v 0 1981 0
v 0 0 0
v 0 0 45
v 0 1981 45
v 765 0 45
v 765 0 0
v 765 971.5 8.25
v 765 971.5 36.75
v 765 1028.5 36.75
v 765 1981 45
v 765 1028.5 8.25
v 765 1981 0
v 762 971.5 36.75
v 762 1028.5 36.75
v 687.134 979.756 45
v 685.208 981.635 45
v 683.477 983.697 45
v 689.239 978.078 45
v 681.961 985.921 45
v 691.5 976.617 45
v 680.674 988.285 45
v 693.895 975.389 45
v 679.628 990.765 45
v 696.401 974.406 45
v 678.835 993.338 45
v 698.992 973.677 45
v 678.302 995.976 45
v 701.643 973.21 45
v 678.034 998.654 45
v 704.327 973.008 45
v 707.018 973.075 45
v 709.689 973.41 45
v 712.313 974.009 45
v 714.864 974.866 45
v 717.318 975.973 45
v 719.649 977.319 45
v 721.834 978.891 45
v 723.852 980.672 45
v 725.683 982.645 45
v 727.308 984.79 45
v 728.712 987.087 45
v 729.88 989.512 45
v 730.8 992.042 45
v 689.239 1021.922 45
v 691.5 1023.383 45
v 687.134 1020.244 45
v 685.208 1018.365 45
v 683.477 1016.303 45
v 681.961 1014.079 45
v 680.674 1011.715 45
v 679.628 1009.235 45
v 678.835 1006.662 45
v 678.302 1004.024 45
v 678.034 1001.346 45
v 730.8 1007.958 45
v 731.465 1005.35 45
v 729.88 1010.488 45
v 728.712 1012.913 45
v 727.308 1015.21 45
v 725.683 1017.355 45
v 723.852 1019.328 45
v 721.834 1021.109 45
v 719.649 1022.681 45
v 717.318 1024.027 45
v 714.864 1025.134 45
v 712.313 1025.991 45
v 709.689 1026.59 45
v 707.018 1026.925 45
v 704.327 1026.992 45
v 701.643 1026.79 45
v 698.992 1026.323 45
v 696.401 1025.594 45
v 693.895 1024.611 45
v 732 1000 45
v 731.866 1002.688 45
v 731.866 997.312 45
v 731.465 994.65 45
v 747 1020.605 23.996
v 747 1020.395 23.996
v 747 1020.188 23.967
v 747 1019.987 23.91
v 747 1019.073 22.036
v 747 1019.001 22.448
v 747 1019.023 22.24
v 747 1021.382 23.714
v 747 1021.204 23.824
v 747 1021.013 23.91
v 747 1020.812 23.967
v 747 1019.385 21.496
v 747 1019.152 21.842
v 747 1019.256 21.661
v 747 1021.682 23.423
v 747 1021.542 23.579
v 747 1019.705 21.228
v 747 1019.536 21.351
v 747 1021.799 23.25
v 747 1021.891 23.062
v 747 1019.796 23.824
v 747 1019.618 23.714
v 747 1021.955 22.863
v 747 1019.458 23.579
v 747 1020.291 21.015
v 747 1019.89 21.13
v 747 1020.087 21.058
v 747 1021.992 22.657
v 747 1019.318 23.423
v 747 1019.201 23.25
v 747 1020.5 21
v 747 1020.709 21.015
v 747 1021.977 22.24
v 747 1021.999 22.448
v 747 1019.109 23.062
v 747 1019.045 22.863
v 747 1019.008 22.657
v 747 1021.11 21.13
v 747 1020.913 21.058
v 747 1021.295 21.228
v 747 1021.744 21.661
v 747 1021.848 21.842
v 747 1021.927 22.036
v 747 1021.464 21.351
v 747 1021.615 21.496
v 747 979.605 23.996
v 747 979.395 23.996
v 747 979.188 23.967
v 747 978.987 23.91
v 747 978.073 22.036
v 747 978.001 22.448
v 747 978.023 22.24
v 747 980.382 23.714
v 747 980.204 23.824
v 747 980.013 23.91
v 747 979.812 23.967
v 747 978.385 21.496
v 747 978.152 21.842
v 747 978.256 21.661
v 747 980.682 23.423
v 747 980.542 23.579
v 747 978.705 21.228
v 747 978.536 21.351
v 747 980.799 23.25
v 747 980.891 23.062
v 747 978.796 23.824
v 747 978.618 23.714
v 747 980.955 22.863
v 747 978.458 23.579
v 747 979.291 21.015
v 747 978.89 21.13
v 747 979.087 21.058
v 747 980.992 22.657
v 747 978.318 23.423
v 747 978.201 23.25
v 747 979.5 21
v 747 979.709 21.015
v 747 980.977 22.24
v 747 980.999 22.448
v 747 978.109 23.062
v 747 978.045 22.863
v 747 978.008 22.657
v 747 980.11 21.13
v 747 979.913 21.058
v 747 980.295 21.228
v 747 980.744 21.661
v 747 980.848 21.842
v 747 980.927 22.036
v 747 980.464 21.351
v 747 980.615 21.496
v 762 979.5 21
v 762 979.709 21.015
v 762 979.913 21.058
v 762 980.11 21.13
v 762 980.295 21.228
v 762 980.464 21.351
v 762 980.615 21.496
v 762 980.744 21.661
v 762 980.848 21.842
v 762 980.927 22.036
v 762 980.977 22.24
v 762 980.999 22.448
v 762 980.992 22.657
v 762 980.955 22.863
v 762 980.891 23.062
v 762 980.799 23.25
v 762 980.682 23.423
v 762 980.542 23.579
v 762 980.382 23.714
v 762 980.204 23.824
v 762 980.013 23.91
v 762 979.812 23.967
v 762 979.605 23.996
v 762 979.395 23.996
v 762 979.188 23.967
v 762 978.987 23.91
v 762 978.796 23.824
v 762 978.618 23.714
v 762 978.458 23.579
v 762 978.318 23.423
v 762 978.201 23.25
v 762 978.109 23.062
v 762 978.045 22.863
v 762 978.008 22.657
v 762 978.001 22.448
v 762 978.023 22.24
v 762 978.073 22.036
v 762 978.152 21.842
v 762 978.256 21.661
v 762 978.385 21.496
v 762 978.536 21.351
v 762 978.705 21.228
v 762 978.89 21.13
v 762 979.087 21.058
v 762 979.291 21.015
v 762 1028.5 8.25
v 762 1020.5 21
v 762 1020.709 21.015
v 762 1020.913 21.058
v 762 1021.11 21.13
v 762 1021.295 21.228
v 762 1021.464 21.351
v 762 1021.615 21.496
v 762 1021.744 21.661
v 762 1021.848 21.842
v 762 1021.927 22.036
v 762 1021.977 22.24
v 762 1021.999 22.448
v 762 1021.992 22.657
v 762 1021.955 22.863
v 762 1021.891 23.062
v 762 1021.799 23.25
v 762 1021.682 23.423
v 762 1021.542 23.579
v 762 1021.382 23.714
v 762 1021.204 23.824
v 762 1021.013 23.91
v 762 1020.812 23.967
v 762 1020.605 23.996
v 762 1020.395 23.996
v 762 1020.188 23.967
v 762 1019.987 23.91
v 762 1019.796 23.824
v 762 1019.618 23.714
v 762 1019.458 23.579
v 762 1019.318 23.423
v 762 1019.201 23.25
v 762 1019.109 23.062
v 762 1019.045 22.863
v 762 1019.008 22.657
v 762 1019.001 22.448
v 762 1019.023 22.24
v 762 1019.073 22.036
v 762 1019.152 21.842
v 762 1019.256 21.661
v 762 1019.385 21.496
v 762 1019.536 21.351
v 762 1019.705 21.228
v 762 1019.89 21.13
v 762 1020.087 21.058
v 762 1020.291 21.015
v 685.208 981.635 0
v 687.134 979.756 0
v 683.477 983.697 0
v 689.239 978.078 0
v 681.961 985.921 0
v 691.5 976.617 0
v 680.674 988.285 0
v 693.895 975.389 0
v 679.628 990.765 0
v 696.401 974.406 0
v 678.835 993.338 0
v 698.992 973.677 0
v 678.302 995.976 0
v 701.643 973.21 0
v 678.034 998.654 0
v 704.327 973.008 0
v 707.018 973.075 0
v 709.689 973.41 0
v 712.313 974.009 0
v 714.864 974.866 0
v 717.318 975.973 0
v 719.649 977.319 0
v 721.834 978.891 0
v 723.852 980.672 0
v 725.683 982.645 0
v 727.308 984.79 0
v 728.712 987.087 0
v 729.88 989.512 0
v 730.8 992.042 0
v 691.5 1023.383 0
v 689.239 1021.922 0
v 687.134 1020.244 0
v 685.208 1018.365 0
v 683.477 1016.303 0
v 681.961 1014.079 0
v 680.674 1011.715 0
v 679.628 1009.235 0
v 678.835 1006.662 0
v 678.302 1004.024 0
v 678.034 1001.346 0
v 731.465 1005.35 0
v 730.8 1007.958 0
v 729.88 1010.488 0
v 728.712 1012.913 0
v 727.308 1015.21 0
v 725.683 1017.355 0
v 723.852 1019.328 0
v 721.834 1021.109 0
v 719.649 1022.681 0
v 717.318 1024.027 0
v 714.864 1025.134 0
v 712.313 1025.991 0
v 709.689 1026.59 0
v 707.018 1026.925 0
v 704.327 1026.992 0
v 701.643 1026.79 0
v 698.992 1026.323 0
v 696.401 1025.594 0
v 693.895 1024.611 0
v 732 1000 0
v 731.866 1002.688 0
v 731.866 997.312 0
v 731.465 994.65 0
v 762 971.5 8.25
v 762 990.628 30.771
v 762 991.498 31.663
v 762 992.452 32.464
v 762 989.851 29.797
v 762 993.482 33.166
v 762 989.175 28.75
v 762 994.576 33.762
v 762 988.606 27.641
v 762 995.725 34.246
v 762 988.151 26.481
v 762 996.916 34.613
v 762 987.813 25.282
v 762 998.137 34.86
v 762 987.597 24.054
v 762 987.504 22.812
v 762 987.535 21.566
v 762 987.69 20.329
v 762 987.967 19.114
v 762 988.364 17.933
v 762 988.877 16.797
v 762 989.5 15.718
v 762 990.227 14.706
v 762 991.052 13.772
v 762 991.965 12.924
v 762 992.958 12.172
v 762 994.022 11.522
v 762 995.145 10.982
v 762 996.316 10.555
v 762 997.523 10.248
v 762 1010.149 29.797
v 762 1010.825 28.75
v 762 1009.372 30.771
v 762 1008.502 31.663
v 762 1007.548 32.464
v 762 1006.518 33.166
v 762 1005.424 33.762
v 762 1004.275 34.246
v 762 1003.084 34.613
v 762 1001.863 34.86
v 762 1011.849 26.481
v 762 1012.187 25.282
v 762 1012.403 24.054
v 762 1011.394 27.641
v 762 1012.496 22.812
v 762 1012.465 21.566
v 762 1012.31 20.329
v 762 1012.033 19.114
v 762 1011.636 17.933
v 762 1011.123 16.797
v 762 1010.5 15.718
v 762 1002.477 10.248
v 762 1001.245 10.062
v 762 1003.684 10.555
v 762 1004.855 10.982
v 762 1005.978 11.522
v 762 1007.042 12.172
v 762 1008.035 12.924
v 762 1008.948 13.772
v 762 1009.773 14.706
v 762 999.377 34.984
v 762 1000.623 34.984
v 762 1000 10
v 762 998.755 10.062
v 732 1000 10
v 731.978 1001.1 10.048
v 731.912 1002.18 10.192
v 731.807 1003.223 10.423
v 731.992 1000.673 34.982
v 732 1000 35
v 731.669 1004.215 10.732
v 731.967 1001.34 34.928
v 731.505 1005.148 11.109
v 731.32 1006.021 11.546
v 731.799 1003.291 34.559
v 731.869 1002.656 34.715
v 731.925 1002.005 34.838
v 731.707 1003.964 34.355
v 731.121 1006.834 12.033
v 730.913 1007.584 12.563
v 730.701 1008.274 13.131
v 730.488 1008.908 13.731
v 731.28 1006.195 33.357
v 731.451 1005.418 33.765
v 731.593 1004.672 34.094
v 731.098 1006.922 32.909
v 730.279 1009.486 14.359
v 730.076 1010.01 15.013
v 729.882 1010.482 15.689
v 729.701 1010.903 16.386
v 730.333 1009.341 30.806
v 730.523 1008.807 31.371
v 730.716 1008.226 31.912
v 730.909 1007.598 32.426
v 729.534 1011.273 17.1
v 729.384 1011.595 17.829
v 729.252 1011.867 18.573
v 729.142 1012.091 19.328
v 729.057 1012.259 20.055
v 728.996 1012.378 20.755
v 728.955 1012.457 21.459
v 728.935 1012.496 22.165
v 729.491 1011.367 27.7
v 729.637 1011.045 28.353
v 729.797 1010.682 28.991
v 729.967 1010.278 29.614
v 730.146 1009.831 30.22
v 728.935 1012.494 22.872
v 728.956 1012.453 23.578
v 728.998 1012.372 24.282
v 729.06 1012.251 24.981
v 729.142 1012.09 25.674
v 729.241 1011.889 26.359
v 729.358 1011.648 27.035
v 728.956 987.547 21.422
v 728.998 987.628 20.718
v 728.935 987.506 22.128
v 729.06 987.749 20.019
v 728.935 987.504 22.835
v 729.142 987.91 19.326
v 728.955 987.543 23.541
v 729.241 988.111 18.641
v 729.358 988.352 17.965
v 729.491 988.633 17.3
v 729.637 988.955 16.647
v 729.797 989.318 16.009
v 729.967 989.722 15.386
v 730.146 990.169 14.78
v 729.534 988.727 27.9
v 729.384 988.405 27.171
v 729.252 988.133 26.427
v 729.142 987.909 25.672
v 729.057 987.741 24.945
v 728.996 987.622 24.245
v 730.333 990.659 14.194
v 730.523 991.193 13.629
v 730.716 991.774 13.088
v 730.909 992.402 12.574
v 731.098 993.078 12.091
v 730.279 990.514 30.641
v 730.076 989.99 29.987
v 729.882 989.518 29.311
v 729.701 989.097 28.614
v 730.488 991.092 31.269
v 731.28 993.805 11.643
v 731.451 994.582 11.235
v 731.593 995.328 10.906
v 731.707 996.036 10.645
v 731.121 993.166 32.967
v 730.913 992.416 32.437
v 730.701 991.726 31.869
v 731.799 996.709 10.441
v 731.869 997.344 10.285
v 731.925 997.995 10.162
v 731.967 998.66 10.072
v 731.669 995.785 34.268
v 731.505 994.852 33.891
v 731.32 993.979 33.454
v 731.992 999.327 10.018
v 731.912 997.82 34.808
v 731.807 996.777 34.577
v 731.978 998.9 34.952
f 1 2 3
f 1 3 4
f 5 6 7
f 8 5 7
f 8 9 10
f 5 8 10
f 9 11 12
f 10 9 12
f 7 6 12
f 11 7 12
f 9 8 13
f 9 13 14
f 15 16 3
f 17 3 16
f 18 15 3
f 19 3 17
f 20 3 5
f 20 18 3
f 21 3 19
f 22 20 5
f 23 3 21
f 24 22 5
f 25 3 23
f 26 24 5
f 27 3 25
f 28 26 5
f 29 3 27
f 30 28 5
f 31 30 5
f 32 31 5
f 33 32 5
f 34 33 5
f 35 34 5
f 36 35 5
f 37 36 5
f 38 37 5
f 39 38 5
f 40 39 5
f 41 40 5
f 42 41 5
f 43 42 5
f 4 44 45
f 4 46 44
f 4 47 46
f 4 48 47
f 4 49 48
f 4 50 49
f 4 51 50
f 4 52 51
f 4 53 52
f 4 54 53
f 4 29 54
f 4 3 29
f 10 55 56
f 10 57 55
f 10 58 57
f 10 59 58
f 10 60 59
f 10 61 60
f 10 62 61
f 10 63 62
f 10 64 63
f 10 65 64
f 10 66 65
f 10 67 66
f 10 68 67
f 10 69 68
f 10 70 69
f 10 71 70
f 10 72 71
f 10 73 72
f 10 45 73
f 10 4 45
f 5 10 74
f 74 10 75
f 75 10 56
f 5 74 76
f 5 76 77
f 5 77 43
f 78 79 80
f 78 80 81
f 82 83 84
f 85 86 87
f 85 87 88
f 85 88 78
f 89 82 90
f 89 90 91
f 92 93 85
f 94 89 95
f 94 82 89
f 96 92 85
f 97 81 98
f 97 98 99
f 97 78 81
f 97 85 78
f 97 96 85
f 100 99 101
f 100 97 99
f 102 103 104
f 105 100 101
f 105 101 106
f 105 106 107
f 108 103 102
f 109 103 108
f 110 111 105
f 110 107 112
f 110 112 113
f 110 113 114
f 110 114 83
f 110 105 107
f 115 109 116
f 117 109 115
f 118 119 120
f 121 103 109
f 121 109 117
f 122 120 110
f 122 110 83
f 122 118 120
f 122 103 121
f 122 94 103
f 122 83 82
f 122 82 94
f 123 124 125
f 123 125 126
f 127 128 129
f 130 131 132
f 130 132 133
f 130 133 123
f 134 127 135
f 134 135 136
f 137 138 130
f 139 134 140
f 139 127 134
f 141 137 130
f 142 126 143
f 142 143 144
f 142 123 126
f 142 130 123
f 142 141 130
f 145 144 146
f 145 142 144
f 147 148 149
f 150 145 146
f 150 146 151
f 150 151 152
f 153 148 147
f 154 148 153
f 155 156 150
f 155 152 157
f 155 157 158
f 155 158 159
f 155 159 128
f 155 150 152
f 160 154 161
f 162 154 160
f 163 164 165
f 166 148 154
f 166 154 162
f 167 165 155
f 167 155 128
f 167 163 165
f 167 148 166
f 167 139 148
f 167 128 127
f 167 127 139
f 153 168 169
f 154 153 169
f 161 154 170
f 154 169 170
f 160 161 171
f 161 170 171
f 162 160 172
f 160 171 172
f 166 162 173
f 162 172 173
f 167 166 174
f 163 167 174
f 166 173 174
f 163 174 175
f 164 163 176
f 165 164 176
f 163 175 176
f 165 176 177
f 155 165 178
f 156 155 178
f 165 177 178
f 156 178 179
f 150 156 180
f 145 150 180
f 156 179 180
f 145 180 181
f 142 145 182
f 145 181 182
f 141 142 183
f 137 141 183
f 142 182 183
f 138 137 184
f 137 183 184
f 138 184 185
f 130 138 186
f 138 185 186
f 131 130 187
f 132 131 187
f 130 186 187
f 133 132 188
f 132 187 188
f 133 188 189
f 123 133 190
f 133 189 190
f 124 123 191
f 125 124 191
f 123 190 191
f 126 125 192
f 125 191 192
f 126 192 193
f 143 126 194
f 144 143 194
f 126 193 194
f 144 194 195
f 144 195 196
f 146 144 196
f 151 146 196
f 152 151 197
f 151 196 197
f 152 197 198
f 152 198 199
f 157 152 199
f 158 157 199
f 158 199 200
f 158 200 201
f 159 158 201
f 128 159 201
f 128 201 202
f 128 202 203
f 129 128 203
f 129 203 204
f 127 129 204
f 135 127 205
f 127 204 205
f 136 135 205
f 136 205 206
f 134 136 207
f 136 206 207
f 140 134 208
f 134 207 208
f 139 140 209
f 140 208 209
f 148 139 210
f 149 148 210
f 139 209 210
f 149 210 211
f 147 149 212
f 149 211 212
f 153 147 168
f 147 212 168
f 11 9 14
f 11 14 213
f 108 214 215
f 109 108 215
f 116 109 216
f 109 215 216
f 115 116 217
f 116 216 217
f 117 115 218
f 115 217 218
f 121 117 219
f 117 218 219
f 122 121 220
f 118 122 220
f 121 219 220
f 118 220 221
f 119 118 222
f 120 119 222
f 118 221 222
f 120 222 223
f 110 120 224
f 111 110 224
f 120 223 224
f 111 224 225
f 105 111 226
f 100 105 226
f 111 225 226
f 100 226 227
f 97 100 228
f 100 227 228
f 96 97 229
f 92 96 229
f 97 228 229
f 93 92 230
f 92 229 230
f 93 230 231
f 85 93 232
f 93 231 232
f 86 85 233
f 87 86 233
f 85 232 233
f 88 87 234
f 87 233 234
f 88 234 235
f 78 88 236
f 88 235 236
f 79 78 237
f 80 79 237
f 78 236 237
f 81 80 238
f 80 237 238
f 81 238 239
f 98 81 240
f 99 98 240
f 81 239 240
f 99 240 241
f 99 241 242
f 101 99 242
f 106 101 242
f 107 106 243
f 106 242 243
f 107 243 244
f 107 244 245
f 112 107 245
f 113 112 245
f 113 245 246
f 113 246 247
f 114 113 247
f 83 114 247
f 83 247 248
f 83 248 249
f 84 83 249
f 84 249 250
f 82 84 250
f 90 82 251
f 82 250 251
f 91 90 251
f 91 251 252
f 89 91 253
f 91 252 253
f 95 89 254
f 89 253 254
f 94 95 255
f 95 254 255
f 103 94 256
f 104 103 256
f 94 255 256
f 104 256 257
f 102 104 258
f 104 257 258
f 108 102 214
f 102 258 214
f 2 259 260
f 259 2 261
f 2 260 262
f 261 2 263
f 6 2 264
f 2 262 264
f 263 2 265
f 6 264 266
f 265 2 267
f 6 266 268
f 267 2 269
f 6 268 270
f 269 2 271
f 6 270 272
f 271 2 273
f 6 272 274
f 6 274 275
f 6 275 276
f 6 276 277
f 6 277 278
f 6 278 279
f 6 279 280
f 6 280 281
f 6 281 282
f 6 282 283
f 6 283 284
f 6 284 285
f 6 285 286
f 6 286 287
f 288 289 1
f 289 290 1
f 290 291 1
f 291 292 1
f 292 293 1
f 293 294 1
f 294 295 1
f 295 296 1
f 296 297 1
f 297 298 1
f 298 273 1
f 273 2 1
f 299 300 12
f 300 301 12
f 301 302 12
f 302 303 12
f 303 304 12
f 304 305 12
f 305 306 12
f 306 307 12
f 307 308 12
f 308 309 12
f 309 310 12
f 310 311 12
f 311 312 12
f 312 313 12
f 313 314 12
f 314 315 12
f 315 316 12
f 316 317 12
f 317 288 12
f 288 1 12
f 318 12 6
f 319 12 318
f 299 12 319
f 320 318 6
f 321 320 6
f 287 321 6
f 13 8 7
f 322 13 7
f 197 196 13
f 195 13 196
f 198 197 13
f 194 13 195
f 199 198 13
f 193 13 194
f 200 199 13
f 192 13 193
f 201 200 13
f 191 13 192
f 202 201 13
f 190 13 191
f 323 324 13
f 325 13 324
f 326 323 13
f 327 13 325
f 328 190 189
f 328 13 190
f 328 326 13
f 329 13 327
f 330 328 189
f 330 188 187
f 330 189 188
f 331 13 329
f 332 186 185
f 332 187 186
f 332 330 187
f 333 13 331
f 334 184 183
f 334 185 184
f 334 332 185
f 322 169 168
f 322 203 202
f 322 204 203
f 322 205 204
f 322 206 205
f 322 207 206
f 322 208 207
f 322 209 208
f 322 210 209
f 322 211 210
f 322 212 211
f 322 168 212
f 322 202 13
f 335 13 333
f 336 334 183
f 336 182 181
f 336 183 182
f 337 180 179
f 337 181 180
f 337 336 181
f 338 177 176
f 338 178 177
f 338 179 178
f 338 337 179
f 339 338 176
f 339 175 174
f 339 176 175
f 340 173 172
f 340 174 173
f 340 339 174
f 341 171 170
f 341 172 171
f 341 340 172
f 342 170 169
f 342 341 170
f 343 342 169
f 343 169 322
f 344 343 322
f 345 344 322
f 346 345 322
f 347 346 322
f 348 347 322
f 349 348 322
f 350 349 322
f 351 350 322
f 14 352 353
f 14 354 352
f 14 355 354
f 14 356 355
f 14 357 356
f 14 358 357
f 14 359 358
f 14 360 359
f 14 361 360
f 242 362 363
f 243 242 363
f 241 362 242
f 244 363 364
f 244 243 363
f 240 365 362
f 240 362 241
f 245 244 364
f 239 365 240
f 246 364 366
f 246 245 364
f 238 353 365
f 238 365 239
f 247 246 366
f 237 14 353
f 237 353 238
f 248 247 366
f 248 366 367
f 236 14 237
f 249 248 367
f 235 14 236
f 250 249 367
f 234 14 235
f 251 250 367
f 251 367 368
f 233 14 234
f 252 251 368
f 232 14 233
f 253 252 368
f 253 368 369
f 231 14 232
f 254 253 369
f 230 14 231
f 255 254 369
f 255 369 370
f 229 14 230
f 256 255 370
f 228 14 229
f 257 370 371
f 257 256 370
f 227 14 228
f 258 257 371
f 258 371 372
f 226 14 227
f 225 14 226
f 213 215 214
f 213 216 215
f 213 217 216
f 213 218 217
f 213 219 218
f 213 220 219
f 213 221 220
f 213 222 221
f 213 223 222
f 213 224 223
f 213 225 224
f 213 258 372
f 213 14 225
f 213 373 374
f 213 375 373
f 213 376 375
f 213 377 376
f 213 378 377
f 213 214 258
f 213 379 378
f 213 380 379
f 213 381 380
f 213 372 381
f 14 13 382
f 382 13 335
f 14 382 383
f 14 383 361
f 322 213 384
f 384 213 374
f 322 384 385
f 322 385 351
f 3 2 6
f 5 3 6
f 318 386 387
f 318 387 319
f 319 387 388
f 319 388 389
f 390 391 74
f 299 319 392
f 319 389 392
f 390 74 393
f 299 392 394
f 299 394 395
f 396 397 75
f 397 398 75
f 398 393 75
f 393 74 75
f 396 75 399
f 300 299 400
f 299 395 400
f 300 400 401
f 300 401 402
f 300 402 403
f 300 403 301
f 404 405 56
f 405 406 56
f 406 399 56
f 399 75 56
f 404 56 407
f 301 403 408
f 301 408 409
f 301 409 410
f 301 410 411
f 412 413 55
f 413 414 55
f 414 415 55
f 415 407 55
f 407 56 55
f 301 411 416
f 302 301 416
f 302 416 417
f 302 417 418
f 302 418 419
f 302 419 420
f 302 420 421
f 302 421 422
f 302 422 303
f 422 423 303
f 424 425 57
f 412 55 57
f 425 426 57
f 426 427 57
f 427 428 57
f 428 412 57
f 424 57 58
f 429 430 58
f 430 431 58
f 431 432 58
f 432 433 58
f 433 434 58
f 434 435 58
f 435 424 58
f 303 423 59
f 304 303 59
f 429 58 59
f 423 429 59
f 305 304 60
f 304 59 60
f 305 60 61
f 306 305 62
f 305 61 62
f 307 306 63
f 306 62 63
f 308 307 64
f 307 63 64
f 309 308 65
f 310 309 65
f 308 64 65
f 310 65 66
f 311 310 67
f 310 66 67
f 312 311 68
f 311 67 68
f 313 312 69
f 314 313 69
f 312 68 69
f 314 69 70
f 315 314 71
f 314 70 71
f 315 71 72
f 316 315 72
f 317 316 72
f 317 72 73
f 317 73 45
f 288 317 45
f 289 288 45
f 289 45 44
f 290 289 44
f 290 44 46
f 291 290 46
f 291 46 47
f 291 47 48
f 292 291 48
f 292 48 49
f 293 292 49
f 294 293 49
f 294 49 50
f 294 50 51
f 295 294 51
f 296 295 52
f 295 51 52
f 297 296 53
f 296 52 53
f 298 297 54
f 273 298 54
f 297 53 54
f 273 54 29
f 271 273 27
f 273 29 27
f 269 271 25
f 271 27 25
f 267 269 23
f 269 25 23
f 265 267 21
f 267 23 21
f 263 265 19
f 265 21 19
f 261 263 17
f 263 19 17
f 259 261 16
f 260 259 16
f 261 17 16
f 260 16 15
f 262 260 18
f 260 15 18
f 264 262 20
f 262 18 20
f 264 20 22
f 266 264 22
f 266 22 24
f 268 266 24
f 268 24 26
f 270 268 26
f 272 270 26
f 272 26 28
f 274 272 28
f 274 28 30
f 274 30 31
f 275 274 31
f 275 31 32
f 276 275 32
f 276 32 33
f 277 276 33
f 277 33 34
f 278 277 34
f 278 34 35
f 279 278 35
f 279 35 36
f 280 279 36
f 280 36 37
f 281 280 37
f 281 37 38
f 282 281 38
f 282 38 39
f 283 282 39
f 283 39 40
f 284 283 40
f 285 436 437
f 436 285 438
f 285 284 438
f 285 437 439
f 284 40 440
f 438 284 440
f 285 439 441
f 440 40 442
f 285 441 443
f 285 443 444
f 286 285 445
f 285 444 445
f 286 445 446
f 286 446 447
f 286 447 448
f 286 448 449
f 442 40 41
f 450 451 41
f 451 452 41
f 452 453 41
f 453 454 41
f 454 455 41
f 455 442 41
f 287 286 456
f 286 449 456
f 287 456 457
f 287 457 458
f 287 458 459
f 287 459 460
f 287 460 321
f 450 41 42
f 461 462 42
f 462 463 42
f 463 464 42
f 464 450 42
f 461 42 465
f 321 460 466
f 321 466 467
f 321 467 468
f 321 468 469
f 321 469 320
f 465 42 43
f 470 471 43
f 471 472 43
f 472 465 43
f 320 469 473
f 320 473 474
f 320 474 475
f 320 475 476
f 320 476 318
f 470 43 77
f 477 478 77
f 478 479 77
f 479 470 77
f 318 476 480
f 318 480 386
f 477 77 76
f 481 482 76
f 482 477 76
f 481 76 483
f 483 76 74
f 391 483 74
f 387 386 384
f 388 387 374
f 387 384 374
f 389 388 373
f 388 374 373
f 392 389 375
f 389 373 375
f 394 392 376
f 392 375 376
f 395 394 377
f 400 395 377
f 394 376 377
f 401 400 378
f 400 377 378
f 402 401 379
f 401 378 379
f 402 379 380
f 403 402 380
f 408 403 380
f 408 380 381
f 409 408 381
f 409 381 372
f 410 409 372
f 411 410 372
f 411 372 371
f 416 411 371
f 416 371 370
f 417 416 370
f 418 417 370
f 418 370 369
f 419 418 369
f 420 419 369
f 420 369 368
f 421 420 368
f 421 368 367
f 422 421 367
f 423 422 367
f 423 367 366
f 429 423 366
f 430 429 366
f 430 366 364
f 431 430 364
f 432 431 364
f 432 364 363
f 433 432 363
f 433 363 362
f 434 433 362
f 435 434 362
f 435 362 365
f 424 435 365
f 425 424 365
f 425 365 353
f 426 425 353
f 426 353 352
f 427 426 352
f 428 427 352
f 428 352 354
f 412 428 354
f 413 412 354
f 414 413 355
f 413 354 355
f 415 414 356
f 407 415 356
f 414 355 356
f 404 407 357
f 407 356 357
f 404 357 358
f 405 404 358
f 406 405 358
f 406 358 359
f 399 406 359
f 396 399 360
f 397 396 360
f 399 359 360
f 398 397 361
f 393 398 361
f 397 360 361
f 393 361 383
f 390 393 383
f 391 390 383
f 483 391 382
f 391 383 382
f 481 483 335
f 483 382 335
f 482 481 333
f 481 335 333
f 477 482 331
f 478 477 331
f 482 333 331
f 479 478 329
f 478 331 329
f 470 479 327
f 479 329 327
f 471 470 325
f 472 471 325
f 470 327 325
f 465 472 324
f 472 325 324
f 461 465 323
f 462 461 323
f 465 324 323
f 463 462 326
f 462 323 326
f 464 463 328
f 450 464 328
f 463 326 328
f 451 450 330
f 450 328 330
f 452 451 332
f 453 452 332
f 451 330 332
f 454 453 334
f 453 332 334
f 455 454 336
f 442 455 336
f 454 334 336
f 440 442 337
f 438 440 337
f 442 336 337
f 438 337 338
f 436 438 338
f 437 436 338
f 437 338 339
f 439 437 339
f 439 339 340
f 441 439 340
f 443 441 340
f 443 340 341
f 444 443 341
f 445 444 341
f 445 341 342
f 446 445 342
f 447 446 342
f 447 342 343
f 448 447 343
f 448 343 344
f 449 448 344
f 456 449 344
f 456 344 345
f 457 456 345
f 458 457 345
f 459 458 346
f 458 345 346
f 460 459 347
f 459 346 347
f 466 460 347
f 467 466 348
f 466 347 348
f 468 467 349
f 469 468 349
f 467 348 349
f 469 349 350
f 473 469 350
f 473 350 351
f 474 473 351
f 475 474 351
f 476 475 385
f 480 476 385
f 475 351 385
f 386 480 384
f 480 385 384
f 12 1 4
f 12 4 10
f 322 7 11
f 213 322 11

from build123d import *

# Parameters (mm, degrees)
SKETCH1_W           = 765
SKETCH1_H           = 1981
BOSS_EXTRUDE1_DEPTH = 45
SKETCH2_R           = 27
CUT_EXTRUDE1_DEPTH  = 46
CUT_EXTRUDE2_REACH  = 767
SKETCH3_R           = 12.5
SKETCH4_W           = 28.5
SKETCH4_H           = 57
CUT_EXTRUDE3_DEPTH  = 3
SKETCH5_R           = 1.5
CUT_EXTRUDE4_DEPTH  = 15


with BuildPart() as part:
    # Sketch1 → Boss-Extrude1 (new body)
    with BuildSketch(Plane.XY):
        with Locations((382.5, 990.5)):
            Rectangle(SKETCH1_W, SKETCH1_H)
    extrude(amount=BOSS_EXTRUDE1_DEPTH)

    # Sketch2 → Cut-Extrude1 (cut, through all)
    with BuildSketch(Plane.XY.offset(45)):
        with Locations((705, 1000)):
            Circle(SKETCH2_R)
    extrude(amount=-CUT_EXTRUDE1_DEPTH, mode=Mode.SUBTRACT)

    # Sketch3 → Cut-Extrude2 (cut, up to next)
    with BuildSketch(Plane(origin=(765, 0, 0), x_dir=(0, 0, -1), z_dir=(1, 0, 0)), mode=Mode.PRIVATE) as cut_extrude2_sk1:
        with Locations((-22.5, 1000)):
            Circle(SKETCH3_R)
    cut_extrude2_tool1 = extrude(cut_extrude2_sk1.sketch, amount=-CUT_EXTRUDE2_REACH, mode=Mode.PRIVATE) & part.part
    add(cut_extrude2_tool1.solids().sort_by_distance((765, 1000, 22.5))[0], mode=Mode.SUBTRACT)

    # Sketch4 → Cut-Extrude3 (cut)
    with BuildSketch(Plane(origin=(765, 0, 0), x_dir=(0, 0, -1), z_dir=(1, 0, 0))):
        with Locations((-22.5, 1000)):
            Rectangle(SKETCH4_W, SKETCH4_H)
    extrude(amount=-CUT_EXTRUDE3_DEPTH, mode=Mode.SUBTRACT)

    # Sketch5 → Cut-Extrude4 (cut)
    with BuildSketch(Plane(origin=(762, 0, 0), x_dir=(0, 0, -1), z_dir=(1, 0, 0))):
        with Locations((-22.5, 1020.5)):
            Circle(SKETCH5_R)
        with Locations((-22.5, 979.5)):
            Circle(SKETCH5_R)
    extrude(amount=-CUT_EXTRUDE4_DEPTH, mode=Mode.SUBTRACT)


solid = part.part
